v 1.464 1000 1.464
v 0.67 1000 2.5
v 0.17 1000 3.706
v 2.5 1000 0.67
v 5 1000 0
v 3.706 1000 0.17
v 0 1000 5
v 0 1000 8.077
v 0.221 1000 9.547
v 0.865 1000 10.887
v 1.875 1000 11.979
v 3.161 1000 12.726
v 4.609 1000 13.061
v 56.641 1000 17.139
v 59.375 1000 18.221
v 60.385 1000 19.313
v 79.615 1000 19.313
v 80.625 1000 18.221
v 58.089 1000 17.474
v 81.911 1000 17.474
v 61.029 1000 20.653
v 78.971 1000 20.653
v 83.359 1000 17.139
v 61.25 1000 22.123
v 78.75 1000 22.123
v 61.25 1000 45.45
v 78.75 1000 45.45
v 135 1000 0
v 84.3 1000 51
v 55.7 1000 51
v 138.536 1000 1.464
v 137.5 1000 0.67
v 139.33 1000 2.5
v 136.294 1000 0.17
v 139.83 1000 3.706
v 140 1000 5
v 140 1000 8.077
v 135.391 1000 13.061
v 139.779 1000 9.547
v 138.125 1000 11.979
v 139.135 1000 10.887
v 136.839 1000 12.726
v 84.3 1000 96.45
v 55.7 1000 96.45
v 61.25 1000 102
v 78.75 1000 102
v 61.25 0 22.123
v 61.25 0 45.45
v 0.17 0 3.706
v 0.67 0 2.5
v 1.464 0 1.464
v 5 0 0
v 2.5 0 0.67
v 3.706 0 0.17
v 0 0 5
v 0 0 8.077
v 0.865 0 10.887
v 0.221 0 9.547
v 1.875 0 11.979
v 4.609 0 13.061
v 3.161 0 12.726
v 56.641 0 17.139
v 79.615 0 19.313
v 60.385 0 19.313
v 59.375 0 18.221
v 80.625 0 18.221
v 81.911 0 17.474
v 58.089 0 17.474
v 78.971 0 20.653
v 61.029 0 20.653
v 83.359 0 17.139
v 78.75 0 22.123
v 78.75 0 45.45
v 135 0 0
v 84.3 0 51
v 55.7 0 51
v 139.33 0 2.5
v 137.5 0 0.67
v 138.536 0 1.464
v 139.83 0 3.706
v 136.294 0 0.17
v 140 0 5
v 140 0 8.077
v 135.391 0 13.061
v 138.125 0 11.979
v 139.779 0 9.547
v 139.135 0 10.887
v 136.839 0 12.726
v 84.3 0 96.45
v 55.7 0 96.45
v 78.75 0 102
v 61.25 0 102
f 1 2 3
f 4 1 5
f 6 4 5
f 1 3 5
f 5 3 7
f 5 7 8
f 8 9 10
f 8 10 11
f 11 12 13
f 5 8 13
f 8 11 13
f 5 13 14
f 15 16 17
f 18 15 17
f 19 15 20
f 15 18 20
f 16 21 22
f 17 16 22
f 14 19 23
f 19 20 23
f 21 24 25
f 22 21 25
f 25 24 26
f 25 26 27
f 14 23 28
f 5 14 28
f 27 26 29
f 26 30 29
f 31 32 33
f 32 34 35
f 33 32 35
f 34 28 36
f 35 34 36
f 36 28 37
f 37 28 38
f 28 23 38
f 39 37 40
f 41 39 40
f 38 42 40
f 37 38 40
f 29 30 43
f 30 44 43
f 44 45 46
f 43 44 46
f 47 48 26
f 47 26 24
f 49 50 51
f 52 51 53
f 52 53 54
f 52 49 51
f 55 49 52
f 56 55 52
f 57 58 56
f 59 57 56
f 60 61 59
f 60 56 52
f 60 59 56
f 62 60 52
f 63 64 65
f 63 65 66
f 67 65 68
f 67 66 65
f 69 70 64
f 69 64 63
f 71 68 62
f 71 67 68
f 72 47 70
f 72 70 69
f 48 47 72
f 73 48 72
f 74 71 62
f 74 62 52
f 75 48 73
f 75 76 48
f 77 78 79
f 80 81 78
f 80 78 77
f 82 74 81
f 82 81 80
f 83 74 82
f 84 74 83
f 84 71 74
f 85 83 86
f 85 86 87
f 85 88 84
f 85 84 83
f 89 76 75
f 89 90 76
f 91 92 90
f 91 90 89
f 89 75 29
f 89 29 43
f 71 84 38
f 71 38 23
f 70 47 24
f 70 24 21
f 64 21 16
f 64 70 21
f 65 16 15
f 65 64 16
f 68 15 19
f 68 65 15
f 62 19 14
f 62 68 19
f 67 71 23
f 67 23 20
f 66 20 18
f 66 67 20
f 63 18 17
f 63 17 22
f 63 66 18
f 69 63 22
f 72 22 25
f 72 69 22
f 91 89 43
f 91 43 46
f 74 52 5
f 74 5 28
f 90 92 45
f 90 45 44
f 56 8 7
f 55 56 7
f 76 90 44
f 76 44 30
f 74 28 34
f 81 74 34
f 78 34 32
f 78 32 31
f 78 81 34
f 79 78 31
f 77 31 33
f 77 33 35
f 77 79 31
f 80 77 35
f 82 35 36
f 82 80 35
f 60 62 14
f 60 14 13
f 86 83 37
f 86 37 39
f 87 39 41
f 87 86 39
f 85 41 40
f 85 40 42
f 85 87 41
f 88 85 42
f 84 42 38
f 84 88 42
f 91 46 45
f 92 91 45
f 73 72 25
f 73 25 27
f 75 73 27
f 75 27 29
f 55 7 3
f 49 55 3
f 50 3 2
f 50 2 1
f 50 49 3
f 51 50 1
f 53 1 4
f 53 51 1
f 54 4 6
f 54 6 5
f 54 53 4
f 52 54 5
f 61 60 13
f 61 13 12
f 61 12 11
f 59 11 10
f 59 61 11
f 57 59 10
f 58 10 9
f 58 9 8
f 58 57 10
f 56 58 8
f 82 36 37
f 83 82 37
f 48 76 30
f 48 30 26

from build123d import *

# Parameters (mm, degrees)
F1_DEPTH = 1000


with BuildPart() as f1:
    # F0 (on Front) → F1 (new body)
    with BuildSketch(Plane.XZ):
        with BuildLine():
            ThreePointArc((0, 5), (1.464466, 1.464466), (5, 0))
            Line((5, 0), (135, 0))
            ThreePointArc((135, 0), (138.535534, 1.464466), (140, 5))
            Line((140, 5), (140, 8.076507))
            ThreePointArc((140, 8.076507), (138.671049, 11.47112), (135.390639, 13.061223))
            Line((135.390639, 13.061223), (83.359361, 17.138777))
            ThreePointArc((83.359361, 17.138777), (80.078951, 18.72888), (78.75, 22.123493))
            Line((78.75, 22.123493), (78.75, 45.45))
            Line((78.75, 45.45), (84.3, 51))
            Line((84.3, 51), (84.3, 96.45))
            Line((84.3, 96.45), (78.75, 102))
            Line((78.75, 102), (61.25, 102))
            Line((61.25, 102), (55.7, 96.45))
            Line((55.7, 96.45), (55.7, 51))
            Line((55.7, 51), (61.25, 45.45))
            Line((61.25, 45.45), (61.25, 22.123493))
            ThreePointArc((61.25, 22.123493), (59.921049, 18.72888), (56.640639, 17.138777))
            Line((56.640639, 17.138777), (4.609361, 13.061223))
            ThreePointArc((4.609361, 13.061223), (1.328951, 11.47112), (0, 8.076507))
            Line((0, 8.076507), (0, 5))
        make_face()
    extrude(amount=-F1_DEPTH)


solid = f1.part
